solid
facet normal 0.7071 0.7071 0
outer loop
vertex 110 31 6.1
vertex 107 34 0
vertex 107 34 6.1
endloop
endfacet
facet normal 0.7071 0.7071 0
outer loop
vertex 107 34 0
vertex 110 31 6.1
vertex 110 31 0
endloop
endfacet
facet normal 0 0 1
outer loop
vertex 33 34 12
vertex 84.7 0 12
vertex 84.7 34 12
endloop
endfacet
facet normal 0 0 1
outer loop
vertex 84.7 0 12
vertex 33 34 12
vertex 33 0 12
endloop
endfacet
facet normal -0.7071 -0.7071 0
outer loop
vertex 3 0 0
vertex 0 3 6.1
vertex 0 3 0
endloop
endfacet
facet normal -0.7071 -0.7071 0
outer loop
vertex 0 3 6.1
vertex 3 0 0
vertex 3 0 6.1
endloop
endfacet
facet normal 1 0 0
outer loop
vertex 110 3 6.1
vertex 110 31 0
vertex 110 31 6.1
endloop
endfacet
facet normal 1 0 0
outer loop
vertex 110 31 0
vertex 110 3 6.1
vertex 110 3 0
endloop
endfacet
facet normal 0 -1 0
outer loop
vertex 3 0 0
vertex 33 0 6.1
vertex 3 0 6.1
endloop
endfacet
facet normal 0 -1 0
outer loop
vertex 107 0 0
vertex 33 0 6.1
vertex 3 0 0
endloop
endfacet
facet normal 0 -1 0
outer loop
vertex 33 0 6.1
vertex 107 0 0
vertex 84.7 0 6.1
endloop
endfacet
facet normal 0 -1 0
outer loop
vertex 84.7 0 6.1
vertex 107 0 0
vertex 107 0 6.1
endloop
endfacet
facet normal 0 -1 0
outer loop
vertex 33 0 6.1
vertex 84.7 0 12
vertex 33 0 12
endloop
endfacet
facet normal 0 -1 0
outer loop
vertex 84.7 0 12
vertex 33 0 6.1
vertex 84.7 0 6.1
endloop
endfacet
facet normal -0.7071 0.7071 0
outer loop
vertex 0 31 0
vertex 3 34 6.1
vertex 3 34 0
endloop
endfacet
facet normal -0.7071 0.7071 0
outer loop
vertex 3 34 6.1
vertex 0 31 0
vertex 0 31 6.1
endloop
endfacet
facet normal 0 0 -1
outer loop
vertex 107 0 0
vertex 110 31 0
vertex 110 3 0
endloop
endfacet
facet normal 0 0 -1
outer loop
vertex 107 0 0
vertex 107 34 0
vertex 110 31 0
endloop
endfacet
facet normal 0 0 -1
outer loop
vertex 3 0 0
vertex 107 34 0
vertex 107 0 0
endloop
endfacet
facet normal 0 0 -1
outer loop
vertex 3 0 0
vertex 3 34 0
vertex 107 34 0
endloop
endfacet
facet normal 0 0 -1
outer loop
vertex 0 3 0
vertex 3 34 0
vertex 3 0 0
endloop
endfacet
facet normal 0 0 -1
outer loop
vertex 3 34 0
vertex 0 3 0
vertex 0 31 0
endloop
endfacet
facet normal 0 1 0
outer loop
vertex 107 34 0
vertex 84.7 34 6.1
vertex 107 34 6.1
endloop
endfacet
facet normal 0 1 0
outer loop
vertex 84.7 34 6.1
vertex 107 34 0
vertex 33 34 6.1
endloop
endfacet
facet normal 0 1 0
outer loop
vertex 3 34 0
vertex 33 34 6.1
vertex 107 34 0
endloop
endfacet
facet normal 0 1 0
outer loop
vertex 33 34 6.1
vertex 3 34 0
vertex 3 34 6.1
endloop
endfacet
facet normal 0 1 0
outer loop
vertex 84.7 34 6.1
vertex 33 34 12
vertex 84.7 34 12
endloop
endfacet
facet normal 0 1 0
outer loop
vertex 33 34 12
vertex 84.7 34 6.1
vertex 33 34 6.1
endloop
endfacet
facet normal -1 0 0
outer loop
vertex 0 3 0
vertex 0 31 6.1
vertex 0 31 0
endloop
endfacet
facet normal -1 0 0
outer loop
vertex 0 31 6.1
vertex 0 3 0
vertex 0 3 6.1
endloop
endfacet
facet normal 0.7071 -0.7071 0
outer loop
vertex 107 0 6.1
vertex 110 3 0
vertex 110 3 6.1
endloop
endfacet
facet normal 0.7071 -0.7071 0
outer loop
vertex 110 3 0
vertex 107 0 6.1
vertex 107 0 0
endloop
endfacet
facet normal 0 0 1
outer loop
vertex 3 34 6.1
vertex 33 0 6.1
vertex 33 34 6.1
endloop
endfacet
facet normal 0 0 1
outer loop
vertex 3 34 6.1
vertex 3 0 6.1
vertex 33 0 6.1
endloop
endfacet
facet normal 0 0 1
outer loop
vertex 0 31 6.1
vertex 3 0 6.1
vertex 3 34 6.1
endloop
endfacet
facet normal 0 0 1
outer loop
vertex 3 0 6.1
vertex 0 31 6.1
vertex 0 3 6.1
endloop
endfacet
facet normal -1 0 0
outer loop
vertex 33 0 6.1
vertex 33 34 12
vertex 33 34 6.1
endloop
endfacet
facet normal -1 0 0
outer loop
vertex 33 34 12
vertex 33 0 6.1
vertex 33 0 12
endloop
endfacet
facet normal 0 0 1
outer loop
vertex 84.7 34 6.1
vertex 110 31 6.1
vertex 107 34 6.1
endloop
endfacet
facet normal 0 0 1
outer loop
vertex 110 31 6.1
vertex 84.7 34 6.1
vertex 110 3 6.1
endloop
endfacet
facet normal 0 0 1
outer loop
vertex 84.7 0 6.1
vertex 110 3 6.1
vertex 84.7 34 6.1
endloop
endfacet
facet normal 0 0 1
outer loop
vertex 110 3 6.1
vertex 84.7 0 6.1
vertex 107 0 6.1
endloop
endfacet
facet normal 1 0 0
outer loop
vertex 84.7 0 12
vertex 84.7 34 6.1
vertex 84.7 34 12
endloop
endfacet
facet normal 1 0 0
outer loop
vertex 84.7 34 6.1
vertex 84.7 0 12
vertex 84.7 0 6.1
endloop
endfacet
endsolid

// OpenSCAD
$fn = 32;

// ----------------------------------------------------------------------
// Stepped bar: centerstep, 110 x 34 x 12/6.1 mm
// ----------------------------------------------------------------------

// --- parameters (mm) ---
bar_l = 110;              // bar length, X
bar_w = 34;               // bar width, Y
plate_t = 12;             // thickness of the thick zone, Z
thin_t = 6.1;             // thickness of the thin zone
corner_c = 3;             // corner chamfer of the bar
step_cut = 5.9;           // material removed from the thin zone
thick_from = 33;          // start of the thick middle zone
thick_to = 84.7;          // end of the thick middle zone
depth_1 = 5.9;            // depth of cut 1 from the top face
depth_2 = 5.9;            // depth of cut 2 from the top face

profile = [[3, 0], [107, 0], [110, 3], [110, 31], [107, 34], [3, 34], [0, 31], [0, 3]];  // primary outline, 8 points, counter clockwise
void_1 = [[-1, -1], [33, -1], [33, 35], [-1, 35]];  // thin left end, 4 points
void_2 = [[84.7, -1], [111, -1], [111, 35], [84.7, 35]];  // thin right end, 4 points

// --- the one profile operation ---
difference() {
  linear_extrude(height = plate_t) polygon(points = profile);
  translate([0, 0, plate_t - depth_1])
    linear_extrude(height = depth_1 + 1) polygon(points = void_1);
  translate([0, 0, plate_t - depth_2])
    linear_extrude(height = depth_2 + 1) polygon(points = void_2);
}
